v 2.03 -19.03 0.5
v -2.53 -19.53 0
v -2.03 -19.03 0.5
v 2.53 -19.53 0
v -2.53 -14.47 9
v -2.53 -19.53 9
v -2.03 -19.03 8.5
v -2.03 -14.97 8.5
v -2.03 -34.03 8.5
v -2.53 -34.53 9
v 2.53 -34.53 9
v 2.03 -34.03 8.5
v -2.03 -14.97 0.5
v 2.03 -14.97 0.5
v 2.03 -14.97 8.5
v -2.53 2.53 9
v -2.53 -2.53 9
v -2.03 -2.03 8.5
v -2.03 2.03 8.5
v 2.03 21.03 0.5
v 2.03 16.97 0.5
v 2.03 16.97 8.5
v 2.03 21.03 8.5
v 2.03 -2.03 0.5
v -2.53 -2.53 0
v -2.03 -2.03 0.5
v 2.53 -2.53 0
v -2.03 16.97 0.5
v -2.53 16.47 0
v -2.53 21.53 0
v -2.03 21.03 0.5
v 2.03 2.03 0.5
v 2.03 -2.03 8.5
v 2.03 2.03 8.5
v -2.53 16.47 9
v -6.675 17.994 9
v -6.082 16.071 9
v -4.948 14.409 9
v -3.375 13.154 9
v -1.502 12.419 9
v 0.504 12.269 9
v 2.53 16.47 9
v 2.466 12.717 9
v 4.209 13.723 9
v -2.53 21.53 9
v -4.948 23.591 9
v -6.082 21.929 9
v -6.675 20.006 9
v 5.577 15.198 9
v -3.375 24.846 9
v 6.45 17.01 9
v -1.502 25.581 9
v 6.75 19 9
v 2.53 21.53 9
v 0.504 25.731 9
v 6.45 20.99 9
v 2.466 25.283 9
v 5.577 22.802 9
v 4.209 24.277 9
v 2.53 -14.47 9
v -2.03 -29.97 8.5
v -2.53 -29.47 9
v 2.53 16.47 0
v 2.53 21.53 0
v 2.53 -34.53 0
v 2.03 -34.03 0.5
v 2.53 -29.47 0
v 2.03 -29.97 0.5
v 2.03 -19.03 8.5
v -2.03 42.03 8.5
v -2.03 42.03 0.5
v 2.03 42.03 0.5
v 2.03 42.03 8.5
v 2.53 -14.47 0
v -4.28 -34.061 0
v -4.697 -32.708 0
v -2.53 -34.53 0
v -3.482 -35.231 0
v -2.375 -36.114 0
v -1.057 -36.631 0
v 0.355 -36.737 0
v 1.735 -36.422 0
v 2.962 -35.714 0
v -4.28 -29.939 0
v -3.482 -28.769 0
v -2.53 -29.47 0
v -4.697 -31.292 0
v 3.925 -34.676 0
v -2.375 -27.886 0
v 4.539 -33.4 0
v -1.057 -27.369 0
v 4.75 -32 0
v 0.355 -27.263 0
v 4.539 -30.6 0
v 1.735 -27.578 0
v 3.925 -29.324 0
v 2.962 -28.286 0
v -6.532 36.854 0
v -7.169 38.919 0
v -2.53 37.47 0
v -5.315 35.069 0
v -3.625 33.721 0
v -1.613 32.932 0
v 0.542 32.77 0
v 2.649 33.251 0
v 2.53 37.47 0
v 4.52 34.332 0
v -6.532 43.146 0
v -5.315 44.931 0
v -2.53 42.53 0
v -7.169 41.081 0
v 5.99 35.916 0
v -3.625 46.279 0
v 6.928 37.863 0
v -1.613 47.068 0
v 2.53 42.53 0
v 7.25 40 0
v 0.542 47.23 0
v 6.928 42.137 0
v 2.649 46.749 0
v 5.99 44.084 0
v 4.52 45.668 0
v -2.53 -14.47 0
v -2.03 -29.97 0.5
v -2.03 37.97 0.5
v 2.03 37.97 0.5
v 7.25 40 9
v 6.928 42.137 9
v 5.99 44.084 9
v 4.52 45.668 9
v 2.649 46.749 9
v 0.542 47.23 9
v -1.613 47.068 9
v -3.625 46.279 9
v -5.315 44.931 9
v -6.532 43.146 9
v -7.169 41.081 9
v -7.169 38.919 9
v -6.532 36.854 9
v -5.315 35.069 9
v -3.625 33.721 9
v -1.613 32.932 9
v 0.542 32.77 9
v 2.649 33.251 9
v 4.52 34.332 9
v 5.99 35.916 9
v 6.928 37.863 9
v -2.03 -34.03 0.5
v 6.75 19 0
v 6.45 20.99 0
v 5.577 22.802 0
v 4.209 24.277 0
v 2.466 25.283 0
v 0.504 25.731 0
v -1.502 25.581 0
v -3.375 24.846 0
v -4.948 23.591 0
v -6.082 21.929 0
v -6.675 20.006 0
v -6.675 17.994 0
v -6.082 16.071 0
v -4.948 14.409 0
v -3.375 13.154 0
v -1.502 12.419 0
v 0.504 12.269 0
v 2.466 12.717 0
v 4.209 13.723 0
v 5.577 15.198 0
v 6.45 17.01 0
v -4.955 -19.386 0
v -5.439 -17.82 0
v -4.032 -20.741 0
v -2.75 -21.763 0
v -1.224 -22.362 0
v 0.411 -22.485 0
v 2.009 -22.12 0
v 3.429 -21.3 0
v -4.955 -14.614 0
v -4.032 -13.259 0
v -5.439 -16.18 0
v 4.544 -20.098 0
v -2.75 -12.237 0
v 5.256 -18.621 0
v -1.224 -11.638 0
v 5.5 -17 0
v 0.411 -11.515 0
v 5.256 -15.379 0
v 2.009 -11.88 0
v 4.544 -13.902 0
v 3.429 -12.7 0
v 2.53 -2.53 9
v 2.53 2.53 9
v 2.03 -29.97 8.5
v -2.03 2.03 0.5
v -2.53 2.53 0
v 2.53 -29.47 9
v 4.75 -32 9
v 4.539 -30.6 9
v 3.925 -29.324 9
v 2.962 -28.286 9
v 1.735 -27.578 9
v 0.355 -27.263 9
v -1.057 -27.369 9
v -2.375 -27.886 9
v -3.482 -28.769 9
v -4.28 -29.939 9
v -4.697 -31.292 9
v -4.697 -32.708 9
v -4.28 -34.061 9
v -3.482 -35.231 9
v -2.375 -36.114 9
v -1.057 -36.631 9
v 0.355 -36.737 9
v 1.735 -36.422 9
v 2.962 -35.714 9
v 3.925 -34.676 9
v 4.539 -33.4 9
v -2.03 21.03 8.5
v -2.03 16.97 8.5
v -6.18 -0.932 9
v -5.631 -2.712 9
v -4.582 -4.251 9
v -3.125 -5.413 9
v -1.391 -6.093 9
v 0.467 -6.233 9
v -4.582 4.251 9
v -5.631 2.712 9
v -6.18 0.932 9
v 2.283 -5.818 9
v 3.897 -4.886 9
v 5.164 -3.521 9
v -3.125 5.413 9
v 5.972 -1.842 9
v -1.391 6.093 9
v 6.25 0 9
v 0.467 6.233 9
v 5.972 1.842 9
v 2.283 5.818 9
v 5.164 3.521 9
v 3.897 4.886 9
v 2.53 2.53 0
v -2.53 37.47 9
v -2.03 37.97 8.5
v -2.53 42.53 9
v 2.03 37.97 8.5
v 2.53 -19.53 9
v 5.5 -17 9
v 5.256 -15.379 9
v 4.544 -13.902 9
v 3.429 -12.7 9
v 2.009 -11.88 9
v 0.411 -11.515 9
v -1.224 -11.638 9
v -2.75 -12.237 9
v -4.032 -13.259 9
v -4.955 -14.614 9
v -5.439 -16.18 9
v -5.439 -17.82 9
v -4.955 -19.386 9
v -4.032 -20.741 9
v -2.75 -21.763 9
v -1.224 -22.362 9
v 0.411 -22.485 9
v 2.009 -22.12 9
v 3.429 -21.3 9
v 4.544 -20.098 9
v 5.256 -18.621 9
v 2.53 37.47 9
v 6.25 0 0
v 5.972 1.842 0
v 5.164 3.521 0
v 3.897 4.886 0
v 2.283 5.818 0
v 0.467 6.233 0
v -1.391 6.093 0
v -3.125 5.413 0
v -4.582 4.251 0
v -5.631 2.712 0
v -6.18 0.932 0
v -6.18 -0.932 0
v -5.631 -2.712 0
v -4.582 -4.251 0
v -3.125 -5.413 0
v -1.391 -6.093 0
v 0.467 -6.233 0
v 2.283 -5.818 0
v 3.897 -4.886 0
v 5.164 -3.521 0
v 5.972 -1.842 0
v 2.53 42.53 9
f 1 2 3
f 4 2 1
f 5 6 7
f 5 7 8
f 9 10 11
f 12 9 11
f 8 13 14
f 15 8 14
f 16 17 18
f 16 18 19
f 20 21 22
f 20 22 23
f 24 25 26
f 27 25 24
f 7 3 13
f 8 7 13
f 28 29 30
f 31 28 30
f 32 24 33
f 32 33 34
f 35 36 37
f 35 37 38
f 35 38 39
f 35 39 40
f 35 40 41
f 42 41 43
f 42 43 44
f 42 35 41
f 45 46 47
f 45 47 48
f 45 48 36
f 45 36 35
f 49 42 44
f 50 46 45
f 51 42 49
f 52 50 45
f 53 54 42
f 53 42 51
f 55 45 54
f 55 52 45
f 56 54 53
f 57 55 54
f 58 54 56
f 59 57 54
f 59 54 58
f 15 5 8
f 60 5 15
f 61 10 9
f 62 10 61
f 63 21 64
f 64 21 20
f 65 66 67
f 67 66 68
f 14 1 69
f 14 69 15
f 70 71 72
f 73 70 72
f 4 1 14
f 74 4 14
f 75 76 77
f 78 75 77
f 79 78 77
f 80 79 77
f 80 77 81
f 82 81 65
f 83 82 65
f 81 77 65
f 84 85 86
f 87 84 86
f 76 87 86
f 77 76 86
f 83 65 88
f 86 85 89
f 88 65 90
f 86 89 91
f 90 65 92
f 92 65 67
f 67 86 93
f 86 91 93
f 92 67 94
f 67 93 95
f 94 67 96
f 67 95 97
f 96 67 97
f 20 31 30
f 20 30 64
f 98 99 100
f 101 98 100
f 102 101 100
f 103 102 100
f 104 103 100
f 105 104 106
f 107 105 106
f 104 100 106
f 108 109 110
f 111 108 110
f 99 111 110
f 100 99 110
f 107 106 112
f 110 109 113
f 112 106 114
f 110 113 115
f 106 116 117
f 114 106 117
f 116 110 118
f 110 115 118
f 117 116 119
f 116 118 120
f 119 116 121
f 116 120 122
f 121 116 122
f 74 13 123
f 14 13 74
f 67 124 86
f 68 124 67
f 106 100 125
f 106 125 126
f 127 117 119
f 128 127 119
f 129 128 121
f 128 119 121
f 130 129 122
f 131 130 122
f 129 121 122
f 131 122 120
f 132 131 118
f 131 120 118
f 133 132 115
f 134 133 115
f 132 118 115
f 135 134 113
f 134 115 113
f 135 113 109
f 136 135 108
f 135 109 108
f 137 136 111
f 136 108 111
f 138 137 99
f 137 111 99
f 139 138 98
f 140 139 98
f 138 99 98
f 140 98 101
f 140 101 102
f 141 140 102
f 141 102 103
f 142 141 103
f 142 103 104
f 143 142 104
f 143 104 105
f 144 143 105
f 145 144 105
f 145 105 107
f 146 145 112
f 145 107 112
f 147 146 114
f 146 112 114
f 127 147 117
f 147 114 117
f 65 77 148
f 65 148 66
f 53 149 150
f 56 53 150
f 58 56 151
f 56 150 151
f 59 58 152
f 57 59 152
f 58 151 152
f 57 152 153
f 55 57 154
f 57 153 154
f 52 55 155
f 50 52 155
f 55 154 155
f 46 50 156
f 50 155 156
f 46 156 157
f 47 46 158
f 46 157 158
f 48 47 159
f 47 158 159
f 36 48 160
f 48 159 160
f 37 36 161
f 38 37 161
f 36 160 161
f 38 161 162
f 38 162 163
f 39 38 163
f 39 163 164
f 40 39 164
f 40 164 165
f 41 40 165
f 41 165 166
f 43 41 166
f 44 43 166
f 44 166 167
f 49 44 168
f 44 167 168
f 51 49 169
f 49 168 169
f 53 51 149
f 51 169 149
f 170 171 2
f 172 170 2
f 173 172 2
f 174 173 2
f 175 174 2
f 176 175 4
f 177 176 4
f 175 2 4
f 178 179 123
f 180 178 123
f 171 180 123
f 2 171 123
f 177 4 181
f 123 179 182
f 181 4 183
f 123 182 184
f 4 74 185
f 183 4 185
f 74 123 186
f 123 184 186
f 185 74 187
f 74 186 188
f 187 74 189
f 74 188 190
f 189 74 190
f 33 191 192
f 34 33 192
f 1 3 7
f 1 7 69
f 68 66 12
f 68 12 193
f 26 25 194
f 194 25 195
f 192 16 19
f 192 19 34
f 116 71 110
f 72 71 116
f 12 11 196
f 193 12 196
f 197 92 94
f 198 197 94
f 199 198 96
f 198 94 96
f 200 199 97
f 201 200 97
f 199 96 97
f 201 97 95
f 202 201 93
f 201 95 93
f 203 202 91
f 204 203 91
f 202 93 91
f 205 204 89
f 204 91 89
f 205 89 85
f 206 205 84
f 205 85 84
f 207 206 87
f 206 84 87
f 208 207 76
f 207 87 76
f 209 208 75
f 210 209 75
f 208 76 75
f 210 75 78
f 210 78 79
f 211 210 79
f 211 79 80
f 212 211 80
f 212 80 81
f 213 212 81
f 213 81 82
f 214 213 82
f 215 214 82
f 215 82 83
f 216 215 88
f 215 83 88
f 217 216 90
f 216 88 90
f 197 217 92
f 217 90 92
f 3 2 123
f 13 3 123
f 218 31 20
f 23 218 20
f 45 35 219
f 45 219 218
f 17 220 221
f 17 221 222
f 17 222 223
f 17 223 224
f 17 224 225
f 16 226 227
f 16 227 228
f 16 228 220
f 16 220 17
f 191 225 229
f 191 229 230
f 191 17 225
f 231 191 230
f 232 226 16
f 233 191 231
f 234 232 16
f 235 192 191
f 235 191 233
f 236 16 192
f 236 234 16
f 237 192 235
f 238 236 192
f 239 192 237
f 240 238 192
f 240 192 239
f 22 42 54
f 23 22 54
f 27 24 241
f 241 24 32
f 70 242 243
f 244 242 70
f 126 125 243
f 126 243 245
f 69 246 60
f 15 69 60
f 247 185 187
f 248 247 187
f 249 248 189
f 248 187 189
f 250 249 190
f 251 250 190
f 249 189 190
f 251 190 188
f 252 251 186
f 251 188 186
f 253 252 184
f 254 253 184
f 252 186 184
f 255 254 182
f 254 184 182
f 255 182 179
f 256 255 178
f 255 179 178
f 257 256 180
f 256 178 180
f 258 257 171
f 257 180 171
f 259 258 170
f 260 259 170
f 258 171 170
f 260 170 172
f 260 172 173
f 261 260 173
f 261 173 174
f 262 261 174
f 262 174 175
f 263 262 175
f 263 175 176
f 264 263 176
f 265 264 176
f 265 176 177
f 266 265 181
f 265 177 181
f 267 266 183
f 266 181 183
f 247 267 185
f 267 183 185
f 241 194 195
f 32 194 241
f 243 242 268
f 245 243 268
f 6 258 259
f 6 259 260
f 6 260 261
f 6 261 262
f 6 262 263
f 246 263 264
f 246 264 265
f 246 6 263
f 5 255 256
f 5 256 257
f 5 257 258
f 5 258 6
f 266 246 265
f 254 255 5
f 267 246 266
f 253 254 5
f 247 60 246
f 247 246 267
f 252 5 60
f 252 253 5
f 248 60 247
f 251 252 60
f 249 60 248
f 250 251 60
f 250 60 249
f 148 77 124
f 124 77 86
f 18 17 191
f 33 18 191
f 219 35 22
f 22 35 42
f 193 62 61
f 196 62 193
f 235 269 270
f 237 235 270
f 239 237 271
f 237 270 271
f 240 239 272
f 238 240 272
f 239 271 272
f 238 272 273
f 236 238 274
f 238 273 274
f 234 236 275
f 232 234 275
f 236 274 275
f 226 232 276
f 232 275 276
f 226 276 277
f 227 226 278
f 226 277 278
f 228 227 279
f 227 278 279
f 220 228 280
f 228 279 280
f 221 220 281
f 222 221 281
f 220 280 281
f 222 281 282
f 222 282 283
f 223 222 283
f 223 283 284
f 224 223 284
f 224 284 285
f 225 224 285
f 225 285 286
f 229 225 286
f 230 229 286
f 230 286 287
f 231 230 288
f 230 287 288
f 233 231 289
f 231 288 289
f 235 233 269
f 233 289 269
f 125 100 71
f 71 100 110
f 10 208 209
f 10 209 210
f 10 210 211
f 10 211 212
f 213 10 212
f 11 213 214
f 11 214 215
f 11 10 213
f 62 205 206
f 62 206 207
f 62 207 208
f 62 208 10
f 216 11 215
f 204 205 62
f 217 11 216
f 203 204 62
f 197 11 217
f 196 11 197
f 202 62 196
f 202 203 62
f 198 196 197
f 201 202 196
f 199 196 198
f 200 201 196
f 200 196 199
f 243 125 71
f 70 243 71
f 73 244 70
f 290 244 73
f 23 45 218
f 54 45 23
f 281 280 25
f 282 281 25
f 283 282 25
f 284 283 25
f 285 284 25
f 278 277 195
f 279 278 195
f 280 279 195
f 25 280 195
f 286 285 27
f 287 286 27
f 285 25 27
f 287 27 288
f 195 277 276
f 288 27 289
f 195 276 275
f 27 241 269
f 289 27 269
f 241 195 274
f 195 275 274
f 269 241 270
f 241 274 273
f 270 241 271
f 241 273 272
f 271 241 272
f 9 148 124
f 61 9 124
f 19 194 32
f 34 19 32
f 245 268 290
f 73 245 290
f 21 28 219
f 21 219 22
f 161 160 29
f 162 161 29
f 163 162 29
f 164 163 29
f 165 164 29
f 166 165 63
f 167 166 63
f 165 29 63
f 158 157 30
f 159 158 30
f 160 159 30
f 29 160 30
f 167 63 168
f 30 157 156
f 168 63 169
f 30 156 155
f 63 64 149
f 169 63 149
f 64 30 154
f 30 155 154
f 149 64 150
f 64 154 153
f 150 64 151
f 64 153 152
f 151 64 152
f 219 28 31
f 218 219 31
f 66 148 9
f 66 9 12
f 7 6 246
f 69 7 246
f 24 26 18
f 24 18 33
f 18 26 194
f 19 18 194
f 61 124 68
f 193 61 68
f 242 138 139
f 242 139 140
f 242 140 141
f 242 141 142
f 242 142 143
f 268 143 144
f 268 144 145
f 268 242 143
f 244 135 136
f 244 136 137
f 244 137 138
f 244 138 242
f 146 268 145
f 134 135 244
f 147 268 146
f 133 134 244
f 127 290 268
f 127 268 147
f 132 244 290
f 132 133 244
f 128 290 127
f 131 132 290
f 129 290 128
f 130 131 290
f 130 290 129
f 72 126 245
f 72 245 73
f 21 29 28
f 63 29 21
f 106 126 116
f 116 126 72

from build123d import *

# Parameters (mm, degrees)
F0_R     = 4.75
F0_W     = 4.06
F0_H     = 4.06
F0_R_2   = 5.5
F0_R_3   = 6.25
F0_R_4   = 6.75
F0_R_5   = 7.25
F1_DEPTH = 9
F2_SIZE  = 0.5
F3_SIZE  = 0.5


with BuildPart() as f1:
    # F0 (on Top) → F1 (new body)
    with BuildSketch(Plane.XY):
        with Locations((0, -32)):
            Circle(F0_R)
        with Locations((0, -32)):
            Rectangle(F0_W, F0_H, mode=Mode.SUBTRACT)
        with Locations((0, -17)):
            Circle(F0_R_2)
        with Locations((0, -17)):
            Rectangle(F0_W, F0_H, mode=Mode.SUBTRACT)
        Circle(F0_R_3)
        Rectangle(F0_W, F0_H, mode=Mode.SUBTRACT)
        with Locations((0, 19)):
            Circle(F0_R_4)
        with Locations((0, 19)):
            Rectangle(F0_W, F0_H, mode=Mode.SUBTRACT)
        with Locations((0, 40)):
            Circle(F0_R_5)
        with Locations((0, 40)):
            Rectangle(F0_W, F0_H, mode=Mode.SUBTRACT)
    extrude(amount=F1_DEPTH)

    # F2
    f2_edges = [f1.edges().sort_by_distance(p)[0] for p in [
        (0, 42.03, 9),
        (-2.03, 40, 9),
        (0, 37.97, 9),
        (2.03, 40, 9),
        (-2.03, 19, 9),
        (0, 21.03, 9),
        (2.03, 19, 9),
        (0, 16.97, 9),
        (-2.03, 0, 9),
        (0, 2.03, 9),
        (0, -2.03, 9),
        (2.03, 0, 9),
        (-2.03, -17, 9),
        (0, -14.97, 9),
        (2.03, -17, 9),
        (0, -19.03, 9),
        (-2.03, -32, 9),
        (0, -29.97, 9),
        (2.03, -32, 9),
        (0, -34.03, 9),
    ]]
    chamfer(f2_edges, length=F2_SIZE)

    # F3
    f3_edges = [f1.edges().sort_by_distance(p)[0] for p in [
        (-2.03, 40, 0),
        (0, 37.97, 0),
        (0, 42.03, 0),
        (2.03, 40, 0),
        (-2.03, 19, 0),
        (0, 16.97, 0),
        (2.03, 19, 0),
        (0, 21.03, 0),
        (-2.03, 0, 0),
        (0, 2.03, 0),
        (0, -2.03, 0),
        (2.03, 0, 0),
        (-2.03, -17, 0),
        (0, -19.03, 0),
        (0, -14.97, 0),
        (2.03, -17, 0),
        (-2.03, -32, 0),
        (0, -34.03, 0),
        (0, -29.97, 0),
        (2.03, -32, 0),
    ]]
    chamfer(f3_edges, length=F3_SIZE)


solid = f1.part
